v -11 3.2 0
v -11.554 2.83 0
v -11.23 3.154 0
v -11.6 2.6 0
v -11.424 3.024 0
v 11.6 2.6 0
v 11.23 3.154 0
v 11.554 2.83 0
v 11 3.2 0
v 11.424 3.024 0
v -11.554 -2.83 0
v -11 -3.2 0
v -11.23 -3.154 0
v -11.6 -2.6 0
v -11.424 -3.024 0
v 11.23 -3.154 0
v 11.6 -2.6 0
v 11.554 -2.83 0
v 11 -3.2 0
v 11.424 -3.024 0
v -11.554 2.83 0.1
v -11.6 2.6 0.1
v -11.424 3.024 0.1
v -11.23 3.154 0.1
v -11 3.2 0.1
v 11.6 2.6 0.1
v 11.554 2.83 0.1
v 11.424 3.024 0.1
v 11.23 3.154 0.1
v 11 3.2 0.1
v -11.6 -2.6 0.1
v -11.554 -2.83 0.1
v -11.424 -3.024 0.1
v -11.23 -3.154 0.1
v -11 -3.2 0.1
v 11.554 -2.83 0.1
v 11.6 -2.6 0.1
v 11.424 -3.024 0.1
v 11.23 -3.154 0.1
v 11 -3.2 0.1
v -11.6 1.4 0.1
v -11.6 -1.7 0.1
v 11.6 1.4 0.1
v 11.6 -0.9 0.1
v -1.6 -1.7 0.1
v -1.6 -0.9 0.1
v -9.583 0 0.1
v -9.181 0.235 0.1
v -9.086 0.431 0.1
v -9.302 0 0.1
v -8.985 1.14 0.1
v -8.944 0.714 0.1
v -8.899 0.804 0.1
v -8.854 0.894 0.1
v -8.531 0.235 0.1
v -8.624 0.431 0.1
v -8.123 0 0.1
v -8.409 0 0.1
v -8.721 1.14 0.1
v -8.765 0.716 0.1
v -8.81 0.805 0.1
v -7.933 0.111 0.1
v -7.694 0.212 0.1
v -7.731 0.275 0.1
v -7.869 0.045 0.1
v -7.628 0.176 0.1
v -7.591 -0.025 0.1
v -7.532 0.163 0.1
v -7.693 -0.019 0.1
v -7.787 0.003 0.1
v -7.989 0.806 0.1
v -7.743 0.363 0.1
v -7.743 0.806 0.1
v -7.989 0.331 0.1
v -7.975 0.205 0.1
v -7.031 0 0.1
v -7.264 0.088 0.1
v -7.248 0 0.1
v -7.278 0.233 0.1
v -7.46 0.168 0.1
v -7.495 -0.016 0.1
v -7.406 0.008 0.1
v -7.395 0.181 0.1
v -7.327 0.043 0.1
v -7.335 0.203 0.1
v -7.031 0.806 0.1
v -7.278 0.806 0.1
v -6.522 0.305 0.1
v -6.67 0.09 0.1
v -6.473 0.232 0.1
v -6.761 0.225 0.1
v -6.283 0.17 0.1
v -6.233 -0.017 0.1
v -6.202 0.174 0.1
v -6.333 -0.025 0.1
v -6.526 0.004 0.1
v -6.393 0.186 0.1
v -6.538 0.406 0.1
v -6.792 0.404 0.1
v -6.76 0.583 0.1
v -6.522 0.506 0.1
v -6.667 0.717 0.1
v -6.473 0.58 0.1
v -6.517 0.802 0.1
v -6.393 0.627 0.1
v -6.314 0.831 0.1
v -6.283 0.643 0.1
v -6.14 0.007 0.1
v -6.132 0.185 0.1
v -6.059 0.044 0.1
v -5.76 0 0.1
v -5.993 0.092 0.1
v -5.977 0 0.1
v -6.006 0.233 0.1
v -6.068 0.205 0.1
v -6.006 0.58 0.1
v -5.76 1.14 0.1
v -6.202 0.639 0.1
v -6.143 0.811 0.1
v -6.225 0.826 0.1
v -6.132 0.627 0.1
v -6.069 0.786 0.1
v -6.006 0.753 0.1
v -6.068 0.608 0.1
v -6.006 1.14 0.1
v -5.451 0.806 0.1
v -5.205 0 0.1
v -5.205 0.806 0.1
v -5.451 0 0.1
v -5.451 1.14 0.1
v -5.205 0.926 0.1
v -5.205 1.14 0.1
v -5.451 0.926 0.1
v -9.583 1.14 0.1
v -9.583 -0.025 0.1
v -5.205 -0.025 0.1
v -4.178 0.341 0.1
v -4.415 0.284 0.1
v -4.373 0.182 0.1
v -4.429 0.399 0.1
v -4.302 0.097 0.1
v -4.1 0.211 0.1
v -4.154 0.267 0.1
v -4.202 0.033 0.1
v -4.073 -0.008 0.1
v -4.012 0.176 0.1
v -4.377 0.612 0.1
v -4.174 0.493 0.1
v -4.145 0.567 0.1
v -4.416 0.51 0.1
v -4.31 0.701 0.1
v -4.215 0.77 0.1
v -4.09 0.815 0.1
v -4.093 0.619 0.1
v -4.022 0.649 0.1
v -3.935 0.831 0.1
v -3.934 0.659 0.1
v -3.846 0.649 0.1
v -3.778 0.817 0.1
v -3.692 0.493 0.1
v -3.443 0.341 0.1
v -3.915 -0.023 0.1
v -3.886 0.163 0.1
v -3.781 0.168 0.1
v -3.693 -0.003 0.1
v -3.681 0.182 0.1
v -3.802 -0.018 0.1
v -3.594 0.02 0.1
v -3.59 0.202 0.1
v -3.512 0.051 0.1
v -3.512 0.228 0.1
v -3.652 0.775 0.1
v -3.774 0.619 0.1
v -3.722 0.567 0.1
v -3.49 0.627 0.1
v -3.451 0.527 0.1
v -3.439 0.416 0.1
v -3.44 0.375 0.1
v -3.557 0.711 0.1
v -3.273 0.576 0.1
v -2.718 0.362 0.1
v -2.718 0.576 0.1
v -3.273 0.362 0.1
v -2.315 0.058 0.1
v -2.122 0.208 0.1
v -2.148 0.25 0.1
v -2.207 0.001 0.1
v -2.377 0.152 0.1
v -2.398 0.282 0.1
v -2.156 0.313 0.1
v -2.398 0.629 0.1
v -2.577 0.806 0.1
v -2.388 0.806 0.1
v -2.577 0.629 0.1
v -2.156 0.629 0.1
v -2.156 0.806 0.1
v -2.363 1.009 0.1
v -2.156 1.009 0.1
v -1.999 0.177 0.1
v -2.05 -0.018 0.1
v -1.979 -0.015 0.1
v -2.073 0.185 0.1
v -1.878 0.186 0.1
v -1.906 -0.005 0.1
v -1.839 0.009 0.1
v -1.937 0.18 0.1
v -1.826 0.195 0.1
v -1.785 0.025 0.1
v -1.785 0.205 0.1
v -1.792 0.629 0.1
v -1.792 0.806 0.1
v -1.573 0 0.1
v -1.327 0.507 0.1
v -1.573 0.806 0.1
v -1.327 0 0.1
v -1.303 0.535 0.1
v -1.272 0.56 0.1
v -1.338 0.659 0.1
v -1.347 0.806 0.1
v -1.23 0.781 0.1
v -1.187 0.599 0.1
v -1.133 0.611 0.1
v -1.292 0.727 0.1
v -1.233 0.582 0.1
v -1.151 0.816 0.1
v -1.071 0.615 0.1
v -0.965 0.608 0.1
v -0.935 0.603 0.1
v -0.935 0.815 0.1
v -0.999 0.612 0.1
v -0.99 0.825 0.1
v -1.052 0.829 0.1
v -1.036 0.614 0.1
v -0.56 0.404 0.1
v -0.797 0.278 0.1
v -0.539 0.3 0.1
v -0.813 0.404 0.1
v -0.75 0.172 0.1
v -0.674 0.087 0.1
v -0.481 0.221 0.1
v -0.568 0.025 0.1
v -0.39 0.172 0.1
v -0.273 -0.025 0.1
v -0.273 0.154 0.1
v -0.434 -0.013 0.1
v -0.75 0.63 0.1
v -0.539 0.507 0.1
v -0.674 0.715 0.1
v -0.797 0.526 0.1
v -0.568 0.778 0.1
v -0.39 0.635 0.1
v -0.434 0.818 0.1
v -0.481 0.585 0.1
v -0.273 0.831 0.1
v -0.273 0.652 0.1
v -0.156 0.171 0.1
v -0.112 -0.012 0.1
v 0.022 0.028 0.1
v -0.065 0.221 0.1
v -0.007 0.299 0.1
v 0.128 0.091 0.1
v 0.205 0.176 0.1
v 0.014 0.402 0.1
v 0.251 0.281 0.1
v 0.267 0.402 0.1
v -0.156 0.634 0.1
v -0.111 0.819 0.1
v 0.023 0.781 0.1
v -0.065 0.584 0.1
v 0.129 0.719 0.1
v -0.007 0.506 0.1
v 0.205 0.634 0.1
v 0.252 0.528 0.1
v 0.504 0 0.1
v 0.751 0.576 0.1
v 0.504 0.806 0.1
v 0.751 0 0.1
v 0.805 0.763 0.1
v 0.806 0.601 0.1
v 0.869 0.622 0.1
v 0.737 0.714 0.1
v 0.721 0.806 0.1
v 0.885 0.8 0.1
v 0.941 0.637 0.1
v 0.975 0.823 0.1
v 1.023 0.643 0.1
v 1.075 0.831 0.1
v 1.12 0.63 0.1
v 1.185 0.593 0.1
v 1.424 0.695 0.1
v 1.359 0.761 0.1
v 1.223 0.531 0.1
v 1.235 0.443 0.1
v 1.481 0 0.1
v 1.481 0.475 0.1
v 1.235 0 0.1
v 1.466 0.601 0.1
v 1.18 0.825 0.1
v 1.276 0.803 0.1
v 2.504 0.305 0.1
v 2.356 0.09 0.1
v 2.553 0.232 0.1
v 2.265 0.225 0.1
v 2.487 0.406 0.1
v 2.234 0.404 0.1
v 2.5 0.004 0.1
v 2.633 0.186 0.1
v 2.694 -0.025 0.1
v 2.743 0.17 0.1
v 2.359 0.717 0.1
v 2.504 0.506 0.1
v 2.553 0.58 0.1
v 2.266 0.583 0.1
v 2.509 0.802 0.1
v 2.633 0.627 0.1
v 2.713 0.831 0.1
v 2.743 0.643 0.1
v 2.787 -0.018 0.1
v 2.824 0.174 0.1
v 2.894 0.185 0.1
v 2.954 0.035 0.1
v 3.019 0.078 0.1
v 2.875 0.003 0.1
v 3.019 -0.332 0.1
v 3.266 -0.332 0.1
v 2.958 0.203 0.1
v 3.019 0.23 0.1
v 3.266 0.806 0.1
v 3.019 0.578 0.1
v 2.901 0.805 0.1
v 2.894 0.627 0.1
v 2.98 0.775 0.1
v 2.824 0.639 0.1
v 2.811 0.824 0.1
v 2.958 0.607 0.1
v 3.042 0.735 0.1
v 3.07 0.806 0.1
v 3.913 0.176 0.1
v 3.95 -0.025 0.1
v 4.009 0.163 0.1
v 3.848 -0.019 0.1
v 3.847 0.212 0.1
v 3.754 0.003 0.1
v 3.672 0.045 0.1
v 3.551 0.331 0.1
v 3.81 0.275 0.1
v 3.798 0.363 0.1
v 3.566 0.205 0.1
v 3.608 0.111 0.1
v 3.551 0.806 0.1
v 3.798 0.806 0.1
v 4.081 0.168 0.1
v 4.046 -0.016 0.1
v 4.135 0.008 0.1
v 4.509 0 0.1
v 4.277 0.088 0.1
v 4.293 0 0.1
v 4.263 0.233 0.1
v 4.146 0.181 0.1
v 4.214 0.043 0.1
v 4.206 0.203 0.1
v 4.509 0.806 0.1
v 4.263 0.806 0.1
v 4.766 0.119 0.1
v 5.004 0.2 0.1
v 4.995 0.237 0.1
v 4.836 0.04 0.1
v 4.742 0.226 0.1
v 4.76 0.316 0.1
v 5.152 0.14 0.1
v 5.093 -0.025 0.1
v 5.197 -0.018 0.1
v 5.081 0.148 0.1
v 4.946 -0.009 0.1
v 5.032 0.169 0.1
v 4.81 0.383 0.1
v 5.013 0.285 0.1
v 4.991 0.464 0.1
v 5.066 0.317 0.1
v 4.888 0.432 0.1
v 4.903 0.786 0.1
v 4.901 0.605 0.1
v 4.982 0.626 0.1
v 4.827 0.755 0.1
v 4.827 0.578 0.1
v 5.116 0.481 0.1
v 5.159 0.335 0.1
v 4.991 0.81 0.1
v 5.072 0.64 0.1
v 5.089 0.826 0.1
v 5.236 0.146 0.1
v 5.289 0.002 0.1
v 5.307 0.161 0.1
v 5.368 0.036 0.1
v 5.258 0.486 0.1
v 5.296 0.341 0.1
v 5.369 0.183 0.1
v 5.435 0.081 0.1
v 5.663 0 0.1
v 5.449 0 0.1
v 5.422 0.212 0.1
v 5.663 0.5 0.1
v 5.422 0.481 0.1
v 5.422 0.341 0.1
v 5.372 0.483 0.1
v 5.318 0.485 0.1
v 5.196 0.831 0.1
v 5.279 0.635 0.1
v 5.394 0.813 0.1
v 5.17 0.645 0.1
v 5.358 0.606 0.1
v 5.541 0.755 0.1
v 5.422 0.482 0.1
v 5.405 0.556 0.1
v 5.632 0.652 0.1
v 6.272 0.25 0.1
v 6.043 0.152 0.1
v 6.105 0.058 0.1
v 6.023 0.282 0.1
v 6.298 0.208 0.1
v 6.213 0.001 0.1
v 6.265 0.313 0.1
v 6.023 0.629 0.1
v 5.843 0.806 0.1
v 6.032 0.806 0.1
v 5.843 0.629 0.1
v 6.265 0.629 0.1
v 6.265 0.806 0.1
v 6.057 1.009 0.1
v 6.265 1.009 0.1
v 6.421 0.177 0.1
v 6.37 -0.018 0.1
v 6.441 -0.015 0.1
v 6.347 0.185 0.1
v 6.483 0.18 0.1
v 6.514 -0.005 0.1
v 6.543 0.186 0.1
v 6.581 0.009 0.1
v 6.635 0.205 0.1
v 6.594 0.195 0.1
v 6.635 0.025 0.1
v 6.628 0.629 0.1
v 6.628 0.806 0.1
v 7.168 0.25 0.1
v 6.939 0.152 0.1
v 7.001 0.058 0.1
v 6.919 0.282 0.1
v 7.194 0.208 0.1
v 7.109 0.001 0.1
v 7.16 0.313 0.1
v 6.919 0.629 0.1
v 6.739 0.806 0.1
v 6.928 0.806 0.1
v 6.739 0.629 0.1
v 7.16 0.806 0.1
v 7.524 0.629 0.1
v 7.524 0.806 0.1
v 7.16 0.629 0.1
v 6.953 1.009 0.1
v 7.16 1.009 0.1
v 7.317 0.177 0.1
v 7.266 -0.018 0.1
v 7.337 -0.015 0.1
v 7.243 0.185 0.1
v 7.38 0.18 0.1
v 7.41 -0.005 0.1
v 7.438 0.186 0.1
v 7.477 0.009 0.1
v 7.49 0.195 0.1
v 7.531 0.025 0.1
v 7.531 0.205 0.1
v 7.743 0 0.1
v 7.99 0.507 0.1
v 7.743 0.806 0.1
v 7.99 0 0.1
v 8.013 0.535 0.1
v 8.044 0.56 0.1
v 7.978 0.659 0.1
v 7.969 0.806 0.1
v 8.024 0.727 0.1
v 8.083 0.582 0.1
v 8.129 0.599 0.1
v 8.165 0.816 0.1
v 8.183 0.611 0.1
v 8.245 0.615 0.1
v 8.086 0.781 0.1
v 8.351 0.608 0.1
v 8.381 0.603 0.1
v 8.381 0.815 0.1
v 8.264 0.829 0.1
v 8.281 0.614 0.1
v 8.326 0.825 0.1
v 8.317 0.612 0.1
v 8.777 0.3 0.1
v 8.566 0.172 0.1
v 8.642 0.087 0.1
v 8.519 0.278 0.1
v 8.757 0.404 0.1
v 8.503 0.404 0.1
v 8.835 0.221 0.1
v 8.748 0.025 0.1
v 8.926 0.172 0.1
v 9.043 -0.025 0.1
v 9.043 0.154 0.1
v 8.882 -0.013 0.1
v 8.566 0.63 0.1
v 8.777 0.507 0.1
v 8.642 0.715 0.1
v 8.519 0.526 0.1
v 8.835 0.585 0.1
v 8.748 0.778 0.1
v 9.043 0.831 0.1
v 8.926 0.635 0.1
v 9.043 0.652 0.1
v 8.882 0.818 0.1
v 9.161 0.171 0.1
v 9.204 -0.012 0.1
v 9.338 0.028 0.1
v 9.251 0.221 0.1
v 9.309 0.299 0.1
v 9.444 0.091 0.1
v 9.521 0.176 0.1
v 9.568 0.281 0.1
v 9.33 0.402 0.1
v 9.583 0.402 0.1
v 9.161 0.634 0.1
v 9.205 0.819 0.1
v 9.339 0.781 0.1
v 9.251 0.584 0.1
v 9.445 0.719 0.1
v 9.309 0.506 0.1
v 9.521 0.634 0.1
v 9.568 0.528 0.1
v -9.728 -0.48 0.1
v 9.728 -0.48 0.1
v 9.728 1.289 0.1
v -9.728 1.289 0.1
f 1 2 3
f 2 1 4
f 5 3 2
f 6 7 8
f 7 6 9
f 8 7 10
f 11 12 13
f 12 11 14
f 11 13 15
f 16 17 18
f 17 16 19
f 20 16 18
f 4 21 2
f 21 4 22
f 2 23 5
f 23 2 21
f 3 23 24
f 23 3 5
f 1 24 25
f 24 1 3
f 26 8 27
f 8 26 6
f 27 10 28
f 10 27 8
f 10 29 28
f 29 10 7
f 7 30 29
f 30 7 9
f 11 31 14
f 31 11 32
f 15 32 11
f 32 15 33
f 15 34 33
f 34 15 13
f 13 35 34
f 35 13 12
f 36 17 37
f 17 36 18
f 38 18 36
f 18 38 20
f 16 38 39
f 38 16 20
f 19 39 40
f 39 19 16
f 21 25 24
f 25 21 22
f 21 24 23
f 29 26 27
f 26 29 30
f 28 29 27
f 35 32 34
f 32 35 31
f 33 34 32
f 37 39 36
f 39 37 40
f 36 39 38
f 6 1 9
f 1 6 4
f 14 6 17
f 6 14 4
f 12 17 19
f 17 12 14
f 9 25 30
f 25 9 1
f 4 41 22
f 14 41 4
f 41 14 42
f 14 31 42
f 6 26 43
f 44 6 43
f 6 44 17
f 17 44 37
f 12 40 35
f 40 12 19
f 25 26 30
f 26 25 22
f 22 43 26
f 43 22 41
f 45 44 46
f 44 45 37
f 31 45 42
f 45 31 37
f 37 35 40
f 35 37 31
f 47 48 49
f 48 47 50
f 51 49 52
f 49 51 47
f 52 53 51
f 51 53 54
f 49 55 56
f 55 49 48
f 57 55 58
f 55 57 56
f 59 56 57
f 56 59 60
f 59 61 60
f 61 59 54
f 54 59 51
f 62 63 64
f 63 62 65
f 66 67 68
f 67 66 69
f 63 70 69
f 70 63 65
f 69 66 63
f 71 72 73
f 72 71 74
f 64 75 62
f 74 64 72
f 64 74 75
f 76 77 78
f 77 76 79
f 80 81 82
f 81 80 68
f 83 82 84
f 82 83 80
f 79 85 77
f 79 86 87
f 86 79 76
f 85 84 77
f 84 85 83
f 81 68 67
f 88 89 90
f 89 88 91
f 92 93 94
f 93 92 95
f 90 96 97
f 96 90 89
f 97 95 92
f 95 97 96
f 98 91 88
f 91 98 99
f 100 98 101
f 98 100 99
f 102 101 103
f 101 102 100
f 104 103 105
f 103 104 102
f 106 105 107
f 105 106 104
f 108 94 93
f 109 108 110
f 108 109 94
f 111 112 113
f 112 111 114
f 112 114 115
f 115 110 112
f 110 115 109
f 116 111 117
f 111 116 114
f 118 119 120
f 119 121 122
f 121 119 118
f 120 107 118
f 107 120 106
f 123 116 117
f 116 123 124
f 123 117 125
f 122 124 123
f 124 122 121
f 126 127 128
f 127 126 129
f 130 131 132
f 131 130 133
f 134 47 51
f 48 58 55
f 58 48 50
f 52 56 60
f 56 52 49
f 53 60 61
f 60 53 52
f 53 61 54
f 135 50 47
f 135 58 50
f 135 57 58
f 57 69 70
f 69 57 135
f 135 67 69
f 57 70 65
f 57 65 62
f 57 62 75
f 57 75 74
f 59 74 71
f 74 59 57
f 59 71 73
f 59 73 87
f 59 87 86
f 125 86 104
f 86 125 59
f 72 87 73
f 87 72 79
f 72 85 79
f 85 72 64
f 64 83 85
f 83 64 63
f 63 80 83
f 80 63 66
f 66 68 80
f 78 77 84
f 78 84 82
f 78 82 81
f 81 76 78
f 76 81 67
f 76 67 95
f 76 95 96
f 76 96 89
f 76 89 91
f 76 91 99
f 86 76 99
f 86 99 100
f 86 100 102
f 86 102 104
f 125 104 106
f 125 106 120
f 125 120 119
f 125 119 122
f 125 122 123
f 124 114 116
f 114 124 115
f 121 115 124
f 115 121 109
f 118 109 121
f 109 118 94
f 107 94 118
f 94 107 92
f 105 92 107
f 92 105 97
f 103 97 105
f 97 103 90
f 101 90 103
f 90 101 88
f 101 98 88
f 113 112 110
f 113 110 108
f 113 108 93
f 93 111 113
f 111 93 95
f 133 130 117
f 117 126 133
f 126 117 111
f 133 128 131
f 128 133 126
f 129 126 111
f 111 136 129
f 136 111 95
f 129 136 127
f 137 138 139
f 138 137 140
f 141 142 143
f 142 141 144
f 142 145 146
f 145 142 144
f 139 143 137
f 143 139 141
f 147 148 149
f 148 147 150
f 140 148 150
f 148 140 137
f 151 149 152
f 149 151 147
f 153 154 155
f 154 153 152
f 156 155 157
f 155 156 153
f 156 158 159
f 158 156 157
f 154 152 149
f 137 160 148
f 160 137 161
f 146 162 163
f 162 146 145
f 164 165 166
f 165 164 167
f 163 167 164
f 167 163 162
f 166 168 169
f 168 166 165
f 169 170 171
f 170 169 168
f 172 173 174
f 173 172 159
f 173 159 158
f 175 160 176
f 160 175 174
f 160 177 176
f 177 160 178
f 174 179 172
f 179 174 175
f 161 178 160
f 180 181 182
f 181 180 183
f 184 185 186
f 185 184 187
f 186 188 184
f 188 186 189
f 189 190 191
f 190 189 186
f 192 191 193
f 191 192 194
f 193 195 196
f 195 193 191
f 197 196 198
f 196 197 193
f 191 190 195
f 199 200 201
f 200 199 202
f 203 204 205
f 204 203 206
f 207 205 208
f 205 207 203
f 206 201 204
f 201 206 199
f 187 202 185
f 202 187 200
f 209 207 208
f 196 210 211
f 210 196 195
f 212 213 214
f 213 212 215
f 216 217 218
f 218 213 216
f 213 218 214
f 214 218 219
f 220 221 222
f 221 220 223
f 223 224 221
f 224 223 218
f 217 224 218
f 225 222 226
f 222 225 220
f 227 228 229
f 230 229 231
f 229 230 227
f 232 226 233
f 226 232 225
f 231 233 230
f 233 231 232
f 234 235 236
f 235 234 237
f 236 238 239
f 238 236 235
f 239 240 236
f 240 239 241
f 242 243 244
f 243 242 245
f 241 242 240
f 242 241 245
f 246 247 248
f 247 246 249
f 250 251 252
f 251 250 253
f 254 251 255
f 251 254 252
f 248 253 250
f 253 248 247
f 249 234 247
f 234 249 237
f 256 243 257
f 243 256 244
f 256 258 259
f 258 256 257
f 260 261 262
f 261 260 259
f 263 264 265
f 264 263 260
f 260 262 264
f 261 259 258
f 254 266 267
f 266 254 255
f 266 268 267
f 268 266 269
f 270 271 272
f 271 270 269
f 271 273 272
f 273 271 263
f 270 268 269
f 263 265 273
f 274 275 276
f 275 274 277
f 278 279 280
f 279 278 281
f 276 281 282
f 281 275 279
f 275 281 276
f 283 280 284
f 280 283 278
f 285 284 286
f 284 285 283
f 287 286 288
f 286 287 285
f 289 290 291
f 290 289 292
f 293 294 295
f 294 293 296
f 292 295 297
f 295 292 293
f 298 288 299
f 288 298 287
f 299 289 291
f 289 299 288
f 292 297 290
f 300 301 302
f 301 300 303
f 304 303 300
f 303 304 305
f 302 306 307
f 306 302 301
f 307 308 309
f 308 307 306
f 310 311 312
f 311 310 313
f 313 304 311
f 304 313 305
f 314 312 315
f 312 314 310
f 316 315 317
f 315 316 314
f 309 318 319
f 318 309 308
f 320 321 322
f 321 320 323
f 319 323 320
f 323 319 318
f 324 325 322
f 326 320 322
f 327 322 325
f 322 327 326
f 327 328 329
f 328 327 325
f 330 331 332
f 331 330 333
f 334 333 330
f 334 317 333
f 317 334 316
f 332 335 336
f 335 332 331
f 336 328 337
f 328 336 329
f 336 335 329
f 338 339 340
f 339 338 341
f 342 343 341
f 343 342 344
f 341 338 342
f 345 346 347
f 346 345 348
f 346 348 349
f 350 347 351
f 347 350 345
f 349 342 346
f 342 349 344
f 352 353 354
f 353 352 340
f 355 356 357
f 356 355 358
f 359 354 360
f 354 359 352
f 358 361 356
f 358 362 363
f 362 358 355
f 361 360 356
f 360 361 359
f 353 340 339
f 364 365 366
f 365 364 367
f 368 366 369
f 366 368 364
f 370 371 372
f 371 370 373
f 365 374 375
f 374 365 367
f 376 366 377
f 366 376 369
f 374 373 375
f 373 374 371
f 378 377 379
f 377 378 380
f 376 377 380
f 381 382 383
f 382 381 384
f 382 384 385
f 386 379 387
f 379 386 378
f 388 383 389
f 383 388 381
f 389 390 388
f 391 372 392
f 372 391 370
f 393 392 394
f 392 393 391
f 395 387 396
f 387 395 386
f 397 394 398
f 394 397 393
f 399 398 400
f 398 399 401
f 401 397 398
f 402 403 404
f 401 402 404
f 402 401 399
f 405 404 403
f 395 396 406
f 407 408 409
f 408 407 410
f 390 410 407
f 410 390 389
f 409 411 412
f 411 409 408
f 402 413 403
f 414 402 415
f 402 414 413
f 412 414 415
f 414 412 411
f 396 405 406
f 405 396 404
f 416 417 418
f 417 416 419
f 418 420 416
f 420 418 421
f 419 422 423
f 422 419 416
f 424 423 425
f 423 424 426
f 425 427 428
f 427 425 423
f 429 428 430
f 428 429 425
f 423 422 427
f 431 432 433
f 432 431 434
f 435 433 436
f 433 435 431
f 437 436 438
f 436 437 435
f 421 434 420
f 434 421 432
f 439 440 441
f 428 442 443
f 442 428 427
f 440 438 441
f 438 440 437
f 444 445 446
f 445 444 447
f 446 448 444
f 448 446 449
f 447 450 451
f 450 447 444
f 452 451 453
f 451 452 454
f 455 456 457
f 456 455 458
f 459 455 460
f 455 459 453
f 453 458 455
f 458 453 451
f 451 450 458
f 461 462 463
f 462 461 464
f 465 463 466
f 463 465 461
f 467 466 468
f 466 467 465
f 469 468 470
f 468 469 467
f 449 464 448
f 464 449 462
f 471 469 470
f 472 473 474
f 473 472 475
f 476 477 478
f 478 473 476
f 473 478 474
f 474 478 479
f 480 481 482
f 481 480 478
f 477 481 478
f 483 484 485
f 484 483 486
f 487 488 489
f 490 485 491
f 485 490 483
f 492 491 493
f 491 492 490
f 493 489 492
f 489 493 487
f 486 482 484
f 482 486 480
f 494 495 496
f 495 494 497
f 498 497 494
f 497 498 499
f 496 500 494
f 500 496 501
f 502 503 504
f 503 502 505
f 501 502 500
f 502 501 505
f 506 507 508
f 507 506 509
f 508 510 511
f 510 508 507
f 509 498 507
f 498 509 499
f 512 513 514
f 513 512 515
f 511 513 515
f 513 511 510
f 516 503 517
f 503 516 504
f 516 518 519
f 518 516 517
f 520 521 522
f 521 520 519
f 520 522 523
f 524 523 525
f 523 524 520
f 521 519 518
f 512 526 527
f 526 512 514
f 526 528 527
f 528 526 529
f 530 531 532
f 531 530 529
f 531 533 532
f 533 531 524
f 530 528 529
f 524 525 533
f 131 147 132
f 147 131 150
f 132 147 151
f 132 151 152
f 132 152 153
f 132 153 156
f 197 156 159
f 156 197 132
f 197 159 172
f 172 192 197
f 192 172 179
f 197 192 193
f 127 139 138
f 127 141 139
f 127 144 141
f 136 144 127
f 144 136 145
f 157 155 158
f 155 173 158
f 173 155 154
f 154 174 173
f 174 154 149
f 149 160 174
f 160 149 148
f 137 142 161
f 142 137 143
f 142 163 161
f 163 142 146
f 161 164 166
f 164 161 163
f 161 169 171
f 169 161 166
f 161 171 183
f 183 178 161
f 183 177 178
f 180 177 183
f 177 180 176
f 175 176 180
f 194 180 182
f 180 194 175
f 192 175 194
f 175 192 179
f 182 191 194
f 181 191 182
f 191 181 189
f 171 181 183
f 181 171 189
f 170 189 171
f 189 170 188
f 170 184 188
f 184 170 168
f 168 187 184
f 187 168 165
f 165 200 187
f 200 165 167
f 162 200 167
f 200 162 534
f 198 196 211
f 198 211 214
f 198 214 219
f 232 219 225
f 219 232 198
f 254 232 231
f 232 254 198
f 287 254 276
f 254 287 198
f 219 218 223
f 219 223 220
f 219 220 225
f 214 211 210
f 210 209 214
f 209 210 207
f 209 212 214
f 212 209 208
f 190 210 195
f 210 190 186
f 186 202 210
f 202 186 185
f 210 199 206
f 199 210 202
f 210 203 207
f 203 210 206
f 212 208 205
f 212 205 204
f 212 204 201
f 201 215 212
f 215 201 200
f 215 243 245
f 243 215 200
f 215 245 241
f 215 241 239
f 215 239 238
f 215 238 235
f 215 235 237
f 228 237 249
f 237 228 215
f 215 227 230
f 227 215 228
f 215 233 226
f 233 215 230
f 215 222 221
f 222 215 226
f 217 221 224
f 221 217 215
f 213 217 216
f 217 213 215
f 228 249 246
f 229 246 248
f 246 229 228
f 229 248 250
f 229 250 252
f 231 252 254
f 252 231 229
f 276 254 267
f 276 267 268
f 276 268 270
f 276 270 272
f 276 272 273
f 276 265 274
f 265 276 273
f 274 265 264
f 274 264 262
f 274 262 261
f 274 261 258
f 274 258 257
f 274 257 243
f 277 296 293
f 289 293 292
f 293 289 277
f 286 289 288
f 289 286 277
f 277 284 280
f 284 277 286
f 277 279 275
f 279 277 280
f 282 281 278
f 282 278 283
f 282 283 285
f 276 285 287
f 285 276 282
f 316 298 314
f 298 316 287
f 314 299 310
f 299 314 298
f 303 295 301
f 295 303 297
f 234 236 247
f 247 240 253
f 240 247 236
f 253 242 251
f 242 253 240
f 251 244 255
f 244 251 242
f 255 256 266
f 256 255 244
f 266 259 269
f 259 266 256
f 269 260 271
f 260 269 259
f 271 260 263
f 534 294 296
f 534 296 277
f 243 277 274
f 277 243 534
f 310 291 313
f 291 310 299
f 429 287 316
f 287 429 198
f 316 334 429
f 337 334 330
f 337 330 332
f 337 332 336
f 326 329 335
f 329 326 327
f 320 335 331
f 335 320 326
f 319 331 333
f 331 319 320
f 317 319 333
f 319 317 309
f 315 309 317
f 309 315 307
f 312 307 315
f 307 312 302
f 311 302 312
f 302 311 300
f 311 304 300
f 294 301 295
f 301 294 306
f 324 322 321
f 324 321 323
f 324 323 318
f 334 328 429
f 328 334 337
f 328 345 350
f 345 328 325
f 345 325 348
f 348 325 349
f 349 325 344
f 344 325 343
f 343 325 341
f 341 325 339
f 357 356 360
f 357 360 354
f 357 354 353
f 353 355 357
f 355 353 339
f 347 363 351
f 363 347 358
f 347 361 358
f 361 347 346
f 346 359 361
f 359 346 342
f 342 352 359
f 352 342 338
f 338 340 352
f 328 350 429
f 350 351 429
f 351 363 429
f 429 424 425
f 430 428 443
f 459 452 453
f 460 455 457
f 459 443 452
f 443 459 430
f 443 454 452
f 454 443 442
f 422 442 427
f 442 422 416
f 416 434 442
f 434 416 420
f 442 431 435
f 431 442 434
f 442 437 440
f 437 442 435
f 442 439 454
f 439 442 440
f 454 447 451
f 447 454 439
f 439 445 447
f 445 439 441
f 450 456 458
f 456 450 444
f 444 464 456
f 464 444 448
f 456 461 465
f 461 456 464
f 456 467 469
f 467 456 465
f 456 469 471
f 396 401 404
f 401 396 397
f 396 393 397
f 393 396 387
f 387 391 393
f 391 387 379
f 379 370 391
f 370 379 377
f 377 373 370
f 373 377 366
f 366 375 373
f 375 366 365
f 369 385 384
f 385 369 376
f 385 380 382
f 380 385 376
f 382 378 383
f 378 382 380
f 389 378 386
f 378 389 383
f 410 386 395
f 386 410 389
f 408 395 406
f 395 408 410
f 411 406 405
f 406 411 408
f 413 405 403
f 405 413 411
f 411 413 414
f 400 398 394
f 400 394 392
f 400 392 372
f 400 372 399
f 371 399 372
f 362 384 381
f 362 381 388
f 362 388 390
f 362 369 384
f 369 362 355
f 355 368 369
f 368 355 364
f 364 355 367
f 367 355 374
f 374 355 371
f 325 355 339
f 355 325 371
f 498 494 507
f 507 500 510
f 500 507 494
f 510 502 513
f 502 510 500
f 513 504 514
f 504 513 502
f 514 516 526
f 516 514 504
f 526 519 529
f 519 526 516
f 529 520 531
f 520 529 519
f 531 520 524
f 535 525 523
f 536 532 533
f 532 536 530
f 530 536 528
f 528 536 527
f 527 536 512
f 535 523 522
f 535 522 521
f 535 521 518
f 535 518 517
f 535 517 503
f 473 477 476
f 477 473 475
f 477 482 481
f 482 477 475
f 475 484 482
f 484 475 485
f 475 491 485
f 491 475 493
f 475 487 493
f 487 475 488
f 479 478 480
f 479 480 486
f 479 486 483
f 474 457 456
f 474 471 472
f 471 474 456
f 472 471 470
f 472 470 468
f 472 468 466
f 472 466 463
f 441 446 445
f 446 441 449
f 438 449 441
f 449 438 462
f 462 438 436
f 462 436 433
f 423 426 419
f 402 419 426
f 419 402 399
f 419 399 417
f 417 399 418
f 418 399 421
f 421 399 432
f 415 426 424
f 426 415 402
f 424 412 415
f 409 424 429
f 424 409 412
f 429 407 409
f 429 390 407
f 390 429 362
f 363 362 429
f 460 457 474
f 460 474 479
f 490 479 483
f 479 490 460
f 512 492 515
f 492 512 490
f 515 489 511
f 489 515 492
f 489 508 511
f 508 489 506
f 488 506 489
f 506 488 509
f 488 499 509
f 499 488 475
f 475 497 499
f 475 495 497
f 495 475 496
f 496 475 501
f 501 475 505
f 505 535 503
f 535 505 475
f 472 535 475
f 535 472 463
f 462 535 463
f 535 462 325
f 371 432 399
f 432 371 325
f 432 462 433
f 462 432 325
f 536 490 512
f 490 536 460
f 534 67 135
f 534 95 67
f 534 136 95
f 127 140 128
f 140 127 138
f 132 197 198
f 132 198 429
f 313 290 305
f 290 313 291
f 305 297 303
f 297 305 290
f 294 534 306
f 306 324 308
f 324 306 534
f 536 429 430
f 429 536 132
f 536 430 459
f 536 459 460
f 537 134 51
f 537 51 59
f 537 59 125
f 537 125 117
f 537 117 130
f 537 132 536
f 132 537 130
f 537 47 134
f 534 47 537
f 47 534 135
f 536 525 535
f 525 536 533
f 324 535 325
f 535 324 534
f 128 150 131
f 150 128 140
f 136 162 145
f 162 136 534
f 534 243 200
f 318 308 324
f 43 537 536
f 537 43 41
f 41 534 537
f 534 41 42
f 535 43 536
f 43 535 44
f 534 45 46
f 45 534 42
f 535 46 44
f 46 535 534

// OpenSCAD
use <../lib.scad>
use <s/6142275us01.scad>
use <s/6142275us02.scad>
function ldraw_lib__6142275u() = [
// 0 Sticker  0.8 x  5.8 with Red Stripe with "Audi e-tron quattro" White Text on Black Background Left
// 0 Name: 6142275u.dat
// 0 Author: Massimo Maso [Sirio]
// 0 !LDRAW_ORG Part UPDATE 2024-11
// 0 !LICENSE Licensed under CC BY 4.0 : see CAreadme.txt
// 
// 0 BFC CERTIFY CCW
  [0,"BFC","CERTIFY"],
  [0,"BFC","CCW"],
// 
// 0 !KEYWORDS Bricklink 75872stk01, Brickowl 776565, R18, Rebrickable 24752
// 0 !KEYWORDS Set 75872, Speed Champions
// 
// 0 !HISTORY 2024-12-30 [OrionP] Official Update 2024-11
// 
// 
// 0 // Subparts
// 1 16 0 0 0 1 0 0 0 1 0 0 0 1 s\6142275us01.dat
  [1,16,0,0,0,1,0,0,0,1,0,0,0,1, ldraw_lib__s__6142275us01()],
// 1 4 0 -.25 1.0104 .3685 0 0 0 1 0 0 0 .3685 s\6142275us02.dat
  [1,4,0,-.25,1.0104,.3685,0,0,0,1,0,0,0,.3685, ldraw_lib__s__6142275us02()],
// 0 // Top red faces
// 4 4 -29 -.25 3.5 -24.321 -.25 3.2214 24.321 -.25 3.2214 29 -.25 3.5
  [4,4,-29,-.25,3.5,-24.321,-.25,3.2214,24.321,-.25,3.2214,29,-.25,3.5],
// 4 4 -29 -.25 3.5 -29 -.25 -4.25 -24.321 -.25 -1.2006 -24.321 -.25 3.2214
  [4,4,-29,-.25,3.5,-29,-.25,-4.25,-24.321,-.25,-1.2006,-24.321,-.25,3.2214],
// 4 4 29 -.25 3.5 24.321 -.25 3.2214 24.321 -.25 -1.2006 29 -.25 -2.25
  [4,4,29,-.25,3.5,24.321,-.25,3.2214,24.321,-.25,-1.2006,29,-.25,-2.25],
// 4 4 -24.321 -.25 -1.2006 -29 -.25 -4.25 -4 -.25 -4.25 -4 -.25 -2.25
  [4,4,-24.321,-.25,-1.2006,-29,-.25,-4.25,-4,-.25,-4.25,-4,-.25,-2.25],
// 4 4 -24.321 -.25 -1.2006 -4 -.25 -2.25 29 -.25 -2.25 24.321 -.25 -1.2006
  [4,4,-24.321,-.25,-1.2006,-4,-.25,-2.25,29,-.25,-2.25,24.321,-.25,-1.2006],
];
module ldraw_lib__6142275u(step=0, col=false, unit=2/5, alt=false, line=0.2, solid=!$preview)
    makepoly(ldraw_lib__6142275u(), step=step, col=col, unit=unit, alt=alt, line=line, solid=solid);
ldraw_lib__6142275u(line=0.2);
